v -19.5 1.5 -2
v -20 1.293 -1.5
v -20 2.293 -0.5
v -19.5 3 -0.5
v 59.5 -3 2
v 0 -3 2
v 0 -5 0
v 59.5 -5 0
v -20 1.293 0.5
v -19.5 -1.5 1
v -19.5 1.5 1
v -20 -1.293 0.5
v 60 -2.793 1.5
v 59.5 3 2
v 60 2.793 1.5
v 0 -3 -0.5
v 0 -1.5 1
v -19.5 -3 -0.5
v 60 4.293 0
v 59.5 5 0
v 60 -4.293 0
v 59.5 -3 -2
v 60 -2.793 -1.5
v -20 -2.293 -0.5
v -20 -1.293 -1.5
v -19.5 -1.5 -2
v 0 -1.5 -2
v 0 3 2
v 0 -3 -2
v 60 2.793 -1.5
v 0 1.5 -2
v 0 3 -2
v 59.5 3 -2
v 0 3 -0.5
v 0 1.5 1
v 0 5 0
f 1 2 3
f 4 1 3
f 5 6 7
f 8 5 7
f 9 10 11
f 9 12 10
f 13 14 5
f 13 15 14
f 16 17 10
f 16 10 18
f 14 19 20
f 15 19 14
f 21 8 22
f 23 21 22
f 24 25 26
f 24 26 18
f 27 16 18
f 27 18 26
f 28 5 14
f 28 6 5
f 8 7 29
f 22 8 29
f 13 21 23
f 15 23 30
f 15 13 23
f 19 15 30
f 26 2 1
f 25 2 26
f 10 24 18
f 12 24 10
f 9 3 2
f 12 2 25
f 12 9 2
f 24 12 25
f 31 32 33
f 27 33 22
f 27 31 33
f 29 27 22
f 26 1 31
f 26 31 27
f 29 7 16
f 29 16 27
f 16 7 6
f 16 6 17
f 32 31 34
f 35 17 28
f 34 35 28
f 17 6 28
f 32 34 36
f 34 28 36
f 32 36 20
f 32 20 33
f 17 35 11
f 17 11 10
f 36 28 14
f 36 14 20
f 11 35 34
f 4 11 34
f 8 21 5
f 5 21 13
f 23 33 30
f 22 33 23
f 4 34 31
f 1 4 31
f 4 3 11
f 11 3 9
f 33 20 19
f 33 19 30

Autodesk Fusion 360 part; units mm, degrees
sketch "Sketch1" plane through (0, 0, 0) normal (1, 0, 0) x (0, 1, 0)
  line L0 (-3, 2) -> (3, 2)
  line L1 (3, 2) -> (3, -2)
  line L2 (3, -2) -> (-3, -2)
  line L3 (-3, -2) -> (-3, 2)
  line L4 (3, 2) -> (5, 0)
  line L5 (5, 0) -> (3, -2)
  line L6 (-3, 2) -> (-5, 0)
  line L7 (-5, 0) -> (-3, -2)
  line L8 (-3, 2) -> (3, -2) construction
  line L9 (3, 2) -> (-3, -2) construction
  dimension "d1" = 10
  dimension "d2" = 2
  dimension "d3" = 4
extrude "Extrude1" add sketch "Sketch1" along normal blind 60
sketch "Sketch2" plane through (0, 0, 0) normal (-1, 0, 0) x (0, -1, 0)
  line L0 (5, 0) -> (3, 2)
  line L1 (-3, 2) -> (-5, 0)
  line L2 (-5, 0) -> (-3, -2)
  line L3 (3, -2) -> (5, 0)
  line L4 (-1.5, 1) -> (1.5, 1)
  line L5 (1.5, 1) -> (1.5, -2)
  line L6 (1.5, -2) -> (-1.5, -2)
  line L7 (-1.5, -2) -> (-1.5, 1)
  line L8 (1.5, 1) -> (3, -0.5)
  line L9 (3, -0.5) -> (1.5, -2)
  line L10 (-1.5, 1) -> (-3, -0.5)
  line L11 (-3, -0.5) -> (-1.5, -2)
  line L12 (3, 2) -> (-3, 2)
  dimension "d12" = 3
  dimension "d13" = 1.5
  dimension "d14" = 45
  dimension "d15" = 45
  dimension "d16" = 1
extrude "Extrude2" add sketch "Sketch2" along normal blind 20
chamfer "Chamfer1" distance 0.5 angle 45 1 faces at (60, -1, -0.6667)
chamfer "Chamfer3" distance 0.5 angle 45 1 faces at (-20, 0.5, 0)
equation "d13 = d12 / 2"
